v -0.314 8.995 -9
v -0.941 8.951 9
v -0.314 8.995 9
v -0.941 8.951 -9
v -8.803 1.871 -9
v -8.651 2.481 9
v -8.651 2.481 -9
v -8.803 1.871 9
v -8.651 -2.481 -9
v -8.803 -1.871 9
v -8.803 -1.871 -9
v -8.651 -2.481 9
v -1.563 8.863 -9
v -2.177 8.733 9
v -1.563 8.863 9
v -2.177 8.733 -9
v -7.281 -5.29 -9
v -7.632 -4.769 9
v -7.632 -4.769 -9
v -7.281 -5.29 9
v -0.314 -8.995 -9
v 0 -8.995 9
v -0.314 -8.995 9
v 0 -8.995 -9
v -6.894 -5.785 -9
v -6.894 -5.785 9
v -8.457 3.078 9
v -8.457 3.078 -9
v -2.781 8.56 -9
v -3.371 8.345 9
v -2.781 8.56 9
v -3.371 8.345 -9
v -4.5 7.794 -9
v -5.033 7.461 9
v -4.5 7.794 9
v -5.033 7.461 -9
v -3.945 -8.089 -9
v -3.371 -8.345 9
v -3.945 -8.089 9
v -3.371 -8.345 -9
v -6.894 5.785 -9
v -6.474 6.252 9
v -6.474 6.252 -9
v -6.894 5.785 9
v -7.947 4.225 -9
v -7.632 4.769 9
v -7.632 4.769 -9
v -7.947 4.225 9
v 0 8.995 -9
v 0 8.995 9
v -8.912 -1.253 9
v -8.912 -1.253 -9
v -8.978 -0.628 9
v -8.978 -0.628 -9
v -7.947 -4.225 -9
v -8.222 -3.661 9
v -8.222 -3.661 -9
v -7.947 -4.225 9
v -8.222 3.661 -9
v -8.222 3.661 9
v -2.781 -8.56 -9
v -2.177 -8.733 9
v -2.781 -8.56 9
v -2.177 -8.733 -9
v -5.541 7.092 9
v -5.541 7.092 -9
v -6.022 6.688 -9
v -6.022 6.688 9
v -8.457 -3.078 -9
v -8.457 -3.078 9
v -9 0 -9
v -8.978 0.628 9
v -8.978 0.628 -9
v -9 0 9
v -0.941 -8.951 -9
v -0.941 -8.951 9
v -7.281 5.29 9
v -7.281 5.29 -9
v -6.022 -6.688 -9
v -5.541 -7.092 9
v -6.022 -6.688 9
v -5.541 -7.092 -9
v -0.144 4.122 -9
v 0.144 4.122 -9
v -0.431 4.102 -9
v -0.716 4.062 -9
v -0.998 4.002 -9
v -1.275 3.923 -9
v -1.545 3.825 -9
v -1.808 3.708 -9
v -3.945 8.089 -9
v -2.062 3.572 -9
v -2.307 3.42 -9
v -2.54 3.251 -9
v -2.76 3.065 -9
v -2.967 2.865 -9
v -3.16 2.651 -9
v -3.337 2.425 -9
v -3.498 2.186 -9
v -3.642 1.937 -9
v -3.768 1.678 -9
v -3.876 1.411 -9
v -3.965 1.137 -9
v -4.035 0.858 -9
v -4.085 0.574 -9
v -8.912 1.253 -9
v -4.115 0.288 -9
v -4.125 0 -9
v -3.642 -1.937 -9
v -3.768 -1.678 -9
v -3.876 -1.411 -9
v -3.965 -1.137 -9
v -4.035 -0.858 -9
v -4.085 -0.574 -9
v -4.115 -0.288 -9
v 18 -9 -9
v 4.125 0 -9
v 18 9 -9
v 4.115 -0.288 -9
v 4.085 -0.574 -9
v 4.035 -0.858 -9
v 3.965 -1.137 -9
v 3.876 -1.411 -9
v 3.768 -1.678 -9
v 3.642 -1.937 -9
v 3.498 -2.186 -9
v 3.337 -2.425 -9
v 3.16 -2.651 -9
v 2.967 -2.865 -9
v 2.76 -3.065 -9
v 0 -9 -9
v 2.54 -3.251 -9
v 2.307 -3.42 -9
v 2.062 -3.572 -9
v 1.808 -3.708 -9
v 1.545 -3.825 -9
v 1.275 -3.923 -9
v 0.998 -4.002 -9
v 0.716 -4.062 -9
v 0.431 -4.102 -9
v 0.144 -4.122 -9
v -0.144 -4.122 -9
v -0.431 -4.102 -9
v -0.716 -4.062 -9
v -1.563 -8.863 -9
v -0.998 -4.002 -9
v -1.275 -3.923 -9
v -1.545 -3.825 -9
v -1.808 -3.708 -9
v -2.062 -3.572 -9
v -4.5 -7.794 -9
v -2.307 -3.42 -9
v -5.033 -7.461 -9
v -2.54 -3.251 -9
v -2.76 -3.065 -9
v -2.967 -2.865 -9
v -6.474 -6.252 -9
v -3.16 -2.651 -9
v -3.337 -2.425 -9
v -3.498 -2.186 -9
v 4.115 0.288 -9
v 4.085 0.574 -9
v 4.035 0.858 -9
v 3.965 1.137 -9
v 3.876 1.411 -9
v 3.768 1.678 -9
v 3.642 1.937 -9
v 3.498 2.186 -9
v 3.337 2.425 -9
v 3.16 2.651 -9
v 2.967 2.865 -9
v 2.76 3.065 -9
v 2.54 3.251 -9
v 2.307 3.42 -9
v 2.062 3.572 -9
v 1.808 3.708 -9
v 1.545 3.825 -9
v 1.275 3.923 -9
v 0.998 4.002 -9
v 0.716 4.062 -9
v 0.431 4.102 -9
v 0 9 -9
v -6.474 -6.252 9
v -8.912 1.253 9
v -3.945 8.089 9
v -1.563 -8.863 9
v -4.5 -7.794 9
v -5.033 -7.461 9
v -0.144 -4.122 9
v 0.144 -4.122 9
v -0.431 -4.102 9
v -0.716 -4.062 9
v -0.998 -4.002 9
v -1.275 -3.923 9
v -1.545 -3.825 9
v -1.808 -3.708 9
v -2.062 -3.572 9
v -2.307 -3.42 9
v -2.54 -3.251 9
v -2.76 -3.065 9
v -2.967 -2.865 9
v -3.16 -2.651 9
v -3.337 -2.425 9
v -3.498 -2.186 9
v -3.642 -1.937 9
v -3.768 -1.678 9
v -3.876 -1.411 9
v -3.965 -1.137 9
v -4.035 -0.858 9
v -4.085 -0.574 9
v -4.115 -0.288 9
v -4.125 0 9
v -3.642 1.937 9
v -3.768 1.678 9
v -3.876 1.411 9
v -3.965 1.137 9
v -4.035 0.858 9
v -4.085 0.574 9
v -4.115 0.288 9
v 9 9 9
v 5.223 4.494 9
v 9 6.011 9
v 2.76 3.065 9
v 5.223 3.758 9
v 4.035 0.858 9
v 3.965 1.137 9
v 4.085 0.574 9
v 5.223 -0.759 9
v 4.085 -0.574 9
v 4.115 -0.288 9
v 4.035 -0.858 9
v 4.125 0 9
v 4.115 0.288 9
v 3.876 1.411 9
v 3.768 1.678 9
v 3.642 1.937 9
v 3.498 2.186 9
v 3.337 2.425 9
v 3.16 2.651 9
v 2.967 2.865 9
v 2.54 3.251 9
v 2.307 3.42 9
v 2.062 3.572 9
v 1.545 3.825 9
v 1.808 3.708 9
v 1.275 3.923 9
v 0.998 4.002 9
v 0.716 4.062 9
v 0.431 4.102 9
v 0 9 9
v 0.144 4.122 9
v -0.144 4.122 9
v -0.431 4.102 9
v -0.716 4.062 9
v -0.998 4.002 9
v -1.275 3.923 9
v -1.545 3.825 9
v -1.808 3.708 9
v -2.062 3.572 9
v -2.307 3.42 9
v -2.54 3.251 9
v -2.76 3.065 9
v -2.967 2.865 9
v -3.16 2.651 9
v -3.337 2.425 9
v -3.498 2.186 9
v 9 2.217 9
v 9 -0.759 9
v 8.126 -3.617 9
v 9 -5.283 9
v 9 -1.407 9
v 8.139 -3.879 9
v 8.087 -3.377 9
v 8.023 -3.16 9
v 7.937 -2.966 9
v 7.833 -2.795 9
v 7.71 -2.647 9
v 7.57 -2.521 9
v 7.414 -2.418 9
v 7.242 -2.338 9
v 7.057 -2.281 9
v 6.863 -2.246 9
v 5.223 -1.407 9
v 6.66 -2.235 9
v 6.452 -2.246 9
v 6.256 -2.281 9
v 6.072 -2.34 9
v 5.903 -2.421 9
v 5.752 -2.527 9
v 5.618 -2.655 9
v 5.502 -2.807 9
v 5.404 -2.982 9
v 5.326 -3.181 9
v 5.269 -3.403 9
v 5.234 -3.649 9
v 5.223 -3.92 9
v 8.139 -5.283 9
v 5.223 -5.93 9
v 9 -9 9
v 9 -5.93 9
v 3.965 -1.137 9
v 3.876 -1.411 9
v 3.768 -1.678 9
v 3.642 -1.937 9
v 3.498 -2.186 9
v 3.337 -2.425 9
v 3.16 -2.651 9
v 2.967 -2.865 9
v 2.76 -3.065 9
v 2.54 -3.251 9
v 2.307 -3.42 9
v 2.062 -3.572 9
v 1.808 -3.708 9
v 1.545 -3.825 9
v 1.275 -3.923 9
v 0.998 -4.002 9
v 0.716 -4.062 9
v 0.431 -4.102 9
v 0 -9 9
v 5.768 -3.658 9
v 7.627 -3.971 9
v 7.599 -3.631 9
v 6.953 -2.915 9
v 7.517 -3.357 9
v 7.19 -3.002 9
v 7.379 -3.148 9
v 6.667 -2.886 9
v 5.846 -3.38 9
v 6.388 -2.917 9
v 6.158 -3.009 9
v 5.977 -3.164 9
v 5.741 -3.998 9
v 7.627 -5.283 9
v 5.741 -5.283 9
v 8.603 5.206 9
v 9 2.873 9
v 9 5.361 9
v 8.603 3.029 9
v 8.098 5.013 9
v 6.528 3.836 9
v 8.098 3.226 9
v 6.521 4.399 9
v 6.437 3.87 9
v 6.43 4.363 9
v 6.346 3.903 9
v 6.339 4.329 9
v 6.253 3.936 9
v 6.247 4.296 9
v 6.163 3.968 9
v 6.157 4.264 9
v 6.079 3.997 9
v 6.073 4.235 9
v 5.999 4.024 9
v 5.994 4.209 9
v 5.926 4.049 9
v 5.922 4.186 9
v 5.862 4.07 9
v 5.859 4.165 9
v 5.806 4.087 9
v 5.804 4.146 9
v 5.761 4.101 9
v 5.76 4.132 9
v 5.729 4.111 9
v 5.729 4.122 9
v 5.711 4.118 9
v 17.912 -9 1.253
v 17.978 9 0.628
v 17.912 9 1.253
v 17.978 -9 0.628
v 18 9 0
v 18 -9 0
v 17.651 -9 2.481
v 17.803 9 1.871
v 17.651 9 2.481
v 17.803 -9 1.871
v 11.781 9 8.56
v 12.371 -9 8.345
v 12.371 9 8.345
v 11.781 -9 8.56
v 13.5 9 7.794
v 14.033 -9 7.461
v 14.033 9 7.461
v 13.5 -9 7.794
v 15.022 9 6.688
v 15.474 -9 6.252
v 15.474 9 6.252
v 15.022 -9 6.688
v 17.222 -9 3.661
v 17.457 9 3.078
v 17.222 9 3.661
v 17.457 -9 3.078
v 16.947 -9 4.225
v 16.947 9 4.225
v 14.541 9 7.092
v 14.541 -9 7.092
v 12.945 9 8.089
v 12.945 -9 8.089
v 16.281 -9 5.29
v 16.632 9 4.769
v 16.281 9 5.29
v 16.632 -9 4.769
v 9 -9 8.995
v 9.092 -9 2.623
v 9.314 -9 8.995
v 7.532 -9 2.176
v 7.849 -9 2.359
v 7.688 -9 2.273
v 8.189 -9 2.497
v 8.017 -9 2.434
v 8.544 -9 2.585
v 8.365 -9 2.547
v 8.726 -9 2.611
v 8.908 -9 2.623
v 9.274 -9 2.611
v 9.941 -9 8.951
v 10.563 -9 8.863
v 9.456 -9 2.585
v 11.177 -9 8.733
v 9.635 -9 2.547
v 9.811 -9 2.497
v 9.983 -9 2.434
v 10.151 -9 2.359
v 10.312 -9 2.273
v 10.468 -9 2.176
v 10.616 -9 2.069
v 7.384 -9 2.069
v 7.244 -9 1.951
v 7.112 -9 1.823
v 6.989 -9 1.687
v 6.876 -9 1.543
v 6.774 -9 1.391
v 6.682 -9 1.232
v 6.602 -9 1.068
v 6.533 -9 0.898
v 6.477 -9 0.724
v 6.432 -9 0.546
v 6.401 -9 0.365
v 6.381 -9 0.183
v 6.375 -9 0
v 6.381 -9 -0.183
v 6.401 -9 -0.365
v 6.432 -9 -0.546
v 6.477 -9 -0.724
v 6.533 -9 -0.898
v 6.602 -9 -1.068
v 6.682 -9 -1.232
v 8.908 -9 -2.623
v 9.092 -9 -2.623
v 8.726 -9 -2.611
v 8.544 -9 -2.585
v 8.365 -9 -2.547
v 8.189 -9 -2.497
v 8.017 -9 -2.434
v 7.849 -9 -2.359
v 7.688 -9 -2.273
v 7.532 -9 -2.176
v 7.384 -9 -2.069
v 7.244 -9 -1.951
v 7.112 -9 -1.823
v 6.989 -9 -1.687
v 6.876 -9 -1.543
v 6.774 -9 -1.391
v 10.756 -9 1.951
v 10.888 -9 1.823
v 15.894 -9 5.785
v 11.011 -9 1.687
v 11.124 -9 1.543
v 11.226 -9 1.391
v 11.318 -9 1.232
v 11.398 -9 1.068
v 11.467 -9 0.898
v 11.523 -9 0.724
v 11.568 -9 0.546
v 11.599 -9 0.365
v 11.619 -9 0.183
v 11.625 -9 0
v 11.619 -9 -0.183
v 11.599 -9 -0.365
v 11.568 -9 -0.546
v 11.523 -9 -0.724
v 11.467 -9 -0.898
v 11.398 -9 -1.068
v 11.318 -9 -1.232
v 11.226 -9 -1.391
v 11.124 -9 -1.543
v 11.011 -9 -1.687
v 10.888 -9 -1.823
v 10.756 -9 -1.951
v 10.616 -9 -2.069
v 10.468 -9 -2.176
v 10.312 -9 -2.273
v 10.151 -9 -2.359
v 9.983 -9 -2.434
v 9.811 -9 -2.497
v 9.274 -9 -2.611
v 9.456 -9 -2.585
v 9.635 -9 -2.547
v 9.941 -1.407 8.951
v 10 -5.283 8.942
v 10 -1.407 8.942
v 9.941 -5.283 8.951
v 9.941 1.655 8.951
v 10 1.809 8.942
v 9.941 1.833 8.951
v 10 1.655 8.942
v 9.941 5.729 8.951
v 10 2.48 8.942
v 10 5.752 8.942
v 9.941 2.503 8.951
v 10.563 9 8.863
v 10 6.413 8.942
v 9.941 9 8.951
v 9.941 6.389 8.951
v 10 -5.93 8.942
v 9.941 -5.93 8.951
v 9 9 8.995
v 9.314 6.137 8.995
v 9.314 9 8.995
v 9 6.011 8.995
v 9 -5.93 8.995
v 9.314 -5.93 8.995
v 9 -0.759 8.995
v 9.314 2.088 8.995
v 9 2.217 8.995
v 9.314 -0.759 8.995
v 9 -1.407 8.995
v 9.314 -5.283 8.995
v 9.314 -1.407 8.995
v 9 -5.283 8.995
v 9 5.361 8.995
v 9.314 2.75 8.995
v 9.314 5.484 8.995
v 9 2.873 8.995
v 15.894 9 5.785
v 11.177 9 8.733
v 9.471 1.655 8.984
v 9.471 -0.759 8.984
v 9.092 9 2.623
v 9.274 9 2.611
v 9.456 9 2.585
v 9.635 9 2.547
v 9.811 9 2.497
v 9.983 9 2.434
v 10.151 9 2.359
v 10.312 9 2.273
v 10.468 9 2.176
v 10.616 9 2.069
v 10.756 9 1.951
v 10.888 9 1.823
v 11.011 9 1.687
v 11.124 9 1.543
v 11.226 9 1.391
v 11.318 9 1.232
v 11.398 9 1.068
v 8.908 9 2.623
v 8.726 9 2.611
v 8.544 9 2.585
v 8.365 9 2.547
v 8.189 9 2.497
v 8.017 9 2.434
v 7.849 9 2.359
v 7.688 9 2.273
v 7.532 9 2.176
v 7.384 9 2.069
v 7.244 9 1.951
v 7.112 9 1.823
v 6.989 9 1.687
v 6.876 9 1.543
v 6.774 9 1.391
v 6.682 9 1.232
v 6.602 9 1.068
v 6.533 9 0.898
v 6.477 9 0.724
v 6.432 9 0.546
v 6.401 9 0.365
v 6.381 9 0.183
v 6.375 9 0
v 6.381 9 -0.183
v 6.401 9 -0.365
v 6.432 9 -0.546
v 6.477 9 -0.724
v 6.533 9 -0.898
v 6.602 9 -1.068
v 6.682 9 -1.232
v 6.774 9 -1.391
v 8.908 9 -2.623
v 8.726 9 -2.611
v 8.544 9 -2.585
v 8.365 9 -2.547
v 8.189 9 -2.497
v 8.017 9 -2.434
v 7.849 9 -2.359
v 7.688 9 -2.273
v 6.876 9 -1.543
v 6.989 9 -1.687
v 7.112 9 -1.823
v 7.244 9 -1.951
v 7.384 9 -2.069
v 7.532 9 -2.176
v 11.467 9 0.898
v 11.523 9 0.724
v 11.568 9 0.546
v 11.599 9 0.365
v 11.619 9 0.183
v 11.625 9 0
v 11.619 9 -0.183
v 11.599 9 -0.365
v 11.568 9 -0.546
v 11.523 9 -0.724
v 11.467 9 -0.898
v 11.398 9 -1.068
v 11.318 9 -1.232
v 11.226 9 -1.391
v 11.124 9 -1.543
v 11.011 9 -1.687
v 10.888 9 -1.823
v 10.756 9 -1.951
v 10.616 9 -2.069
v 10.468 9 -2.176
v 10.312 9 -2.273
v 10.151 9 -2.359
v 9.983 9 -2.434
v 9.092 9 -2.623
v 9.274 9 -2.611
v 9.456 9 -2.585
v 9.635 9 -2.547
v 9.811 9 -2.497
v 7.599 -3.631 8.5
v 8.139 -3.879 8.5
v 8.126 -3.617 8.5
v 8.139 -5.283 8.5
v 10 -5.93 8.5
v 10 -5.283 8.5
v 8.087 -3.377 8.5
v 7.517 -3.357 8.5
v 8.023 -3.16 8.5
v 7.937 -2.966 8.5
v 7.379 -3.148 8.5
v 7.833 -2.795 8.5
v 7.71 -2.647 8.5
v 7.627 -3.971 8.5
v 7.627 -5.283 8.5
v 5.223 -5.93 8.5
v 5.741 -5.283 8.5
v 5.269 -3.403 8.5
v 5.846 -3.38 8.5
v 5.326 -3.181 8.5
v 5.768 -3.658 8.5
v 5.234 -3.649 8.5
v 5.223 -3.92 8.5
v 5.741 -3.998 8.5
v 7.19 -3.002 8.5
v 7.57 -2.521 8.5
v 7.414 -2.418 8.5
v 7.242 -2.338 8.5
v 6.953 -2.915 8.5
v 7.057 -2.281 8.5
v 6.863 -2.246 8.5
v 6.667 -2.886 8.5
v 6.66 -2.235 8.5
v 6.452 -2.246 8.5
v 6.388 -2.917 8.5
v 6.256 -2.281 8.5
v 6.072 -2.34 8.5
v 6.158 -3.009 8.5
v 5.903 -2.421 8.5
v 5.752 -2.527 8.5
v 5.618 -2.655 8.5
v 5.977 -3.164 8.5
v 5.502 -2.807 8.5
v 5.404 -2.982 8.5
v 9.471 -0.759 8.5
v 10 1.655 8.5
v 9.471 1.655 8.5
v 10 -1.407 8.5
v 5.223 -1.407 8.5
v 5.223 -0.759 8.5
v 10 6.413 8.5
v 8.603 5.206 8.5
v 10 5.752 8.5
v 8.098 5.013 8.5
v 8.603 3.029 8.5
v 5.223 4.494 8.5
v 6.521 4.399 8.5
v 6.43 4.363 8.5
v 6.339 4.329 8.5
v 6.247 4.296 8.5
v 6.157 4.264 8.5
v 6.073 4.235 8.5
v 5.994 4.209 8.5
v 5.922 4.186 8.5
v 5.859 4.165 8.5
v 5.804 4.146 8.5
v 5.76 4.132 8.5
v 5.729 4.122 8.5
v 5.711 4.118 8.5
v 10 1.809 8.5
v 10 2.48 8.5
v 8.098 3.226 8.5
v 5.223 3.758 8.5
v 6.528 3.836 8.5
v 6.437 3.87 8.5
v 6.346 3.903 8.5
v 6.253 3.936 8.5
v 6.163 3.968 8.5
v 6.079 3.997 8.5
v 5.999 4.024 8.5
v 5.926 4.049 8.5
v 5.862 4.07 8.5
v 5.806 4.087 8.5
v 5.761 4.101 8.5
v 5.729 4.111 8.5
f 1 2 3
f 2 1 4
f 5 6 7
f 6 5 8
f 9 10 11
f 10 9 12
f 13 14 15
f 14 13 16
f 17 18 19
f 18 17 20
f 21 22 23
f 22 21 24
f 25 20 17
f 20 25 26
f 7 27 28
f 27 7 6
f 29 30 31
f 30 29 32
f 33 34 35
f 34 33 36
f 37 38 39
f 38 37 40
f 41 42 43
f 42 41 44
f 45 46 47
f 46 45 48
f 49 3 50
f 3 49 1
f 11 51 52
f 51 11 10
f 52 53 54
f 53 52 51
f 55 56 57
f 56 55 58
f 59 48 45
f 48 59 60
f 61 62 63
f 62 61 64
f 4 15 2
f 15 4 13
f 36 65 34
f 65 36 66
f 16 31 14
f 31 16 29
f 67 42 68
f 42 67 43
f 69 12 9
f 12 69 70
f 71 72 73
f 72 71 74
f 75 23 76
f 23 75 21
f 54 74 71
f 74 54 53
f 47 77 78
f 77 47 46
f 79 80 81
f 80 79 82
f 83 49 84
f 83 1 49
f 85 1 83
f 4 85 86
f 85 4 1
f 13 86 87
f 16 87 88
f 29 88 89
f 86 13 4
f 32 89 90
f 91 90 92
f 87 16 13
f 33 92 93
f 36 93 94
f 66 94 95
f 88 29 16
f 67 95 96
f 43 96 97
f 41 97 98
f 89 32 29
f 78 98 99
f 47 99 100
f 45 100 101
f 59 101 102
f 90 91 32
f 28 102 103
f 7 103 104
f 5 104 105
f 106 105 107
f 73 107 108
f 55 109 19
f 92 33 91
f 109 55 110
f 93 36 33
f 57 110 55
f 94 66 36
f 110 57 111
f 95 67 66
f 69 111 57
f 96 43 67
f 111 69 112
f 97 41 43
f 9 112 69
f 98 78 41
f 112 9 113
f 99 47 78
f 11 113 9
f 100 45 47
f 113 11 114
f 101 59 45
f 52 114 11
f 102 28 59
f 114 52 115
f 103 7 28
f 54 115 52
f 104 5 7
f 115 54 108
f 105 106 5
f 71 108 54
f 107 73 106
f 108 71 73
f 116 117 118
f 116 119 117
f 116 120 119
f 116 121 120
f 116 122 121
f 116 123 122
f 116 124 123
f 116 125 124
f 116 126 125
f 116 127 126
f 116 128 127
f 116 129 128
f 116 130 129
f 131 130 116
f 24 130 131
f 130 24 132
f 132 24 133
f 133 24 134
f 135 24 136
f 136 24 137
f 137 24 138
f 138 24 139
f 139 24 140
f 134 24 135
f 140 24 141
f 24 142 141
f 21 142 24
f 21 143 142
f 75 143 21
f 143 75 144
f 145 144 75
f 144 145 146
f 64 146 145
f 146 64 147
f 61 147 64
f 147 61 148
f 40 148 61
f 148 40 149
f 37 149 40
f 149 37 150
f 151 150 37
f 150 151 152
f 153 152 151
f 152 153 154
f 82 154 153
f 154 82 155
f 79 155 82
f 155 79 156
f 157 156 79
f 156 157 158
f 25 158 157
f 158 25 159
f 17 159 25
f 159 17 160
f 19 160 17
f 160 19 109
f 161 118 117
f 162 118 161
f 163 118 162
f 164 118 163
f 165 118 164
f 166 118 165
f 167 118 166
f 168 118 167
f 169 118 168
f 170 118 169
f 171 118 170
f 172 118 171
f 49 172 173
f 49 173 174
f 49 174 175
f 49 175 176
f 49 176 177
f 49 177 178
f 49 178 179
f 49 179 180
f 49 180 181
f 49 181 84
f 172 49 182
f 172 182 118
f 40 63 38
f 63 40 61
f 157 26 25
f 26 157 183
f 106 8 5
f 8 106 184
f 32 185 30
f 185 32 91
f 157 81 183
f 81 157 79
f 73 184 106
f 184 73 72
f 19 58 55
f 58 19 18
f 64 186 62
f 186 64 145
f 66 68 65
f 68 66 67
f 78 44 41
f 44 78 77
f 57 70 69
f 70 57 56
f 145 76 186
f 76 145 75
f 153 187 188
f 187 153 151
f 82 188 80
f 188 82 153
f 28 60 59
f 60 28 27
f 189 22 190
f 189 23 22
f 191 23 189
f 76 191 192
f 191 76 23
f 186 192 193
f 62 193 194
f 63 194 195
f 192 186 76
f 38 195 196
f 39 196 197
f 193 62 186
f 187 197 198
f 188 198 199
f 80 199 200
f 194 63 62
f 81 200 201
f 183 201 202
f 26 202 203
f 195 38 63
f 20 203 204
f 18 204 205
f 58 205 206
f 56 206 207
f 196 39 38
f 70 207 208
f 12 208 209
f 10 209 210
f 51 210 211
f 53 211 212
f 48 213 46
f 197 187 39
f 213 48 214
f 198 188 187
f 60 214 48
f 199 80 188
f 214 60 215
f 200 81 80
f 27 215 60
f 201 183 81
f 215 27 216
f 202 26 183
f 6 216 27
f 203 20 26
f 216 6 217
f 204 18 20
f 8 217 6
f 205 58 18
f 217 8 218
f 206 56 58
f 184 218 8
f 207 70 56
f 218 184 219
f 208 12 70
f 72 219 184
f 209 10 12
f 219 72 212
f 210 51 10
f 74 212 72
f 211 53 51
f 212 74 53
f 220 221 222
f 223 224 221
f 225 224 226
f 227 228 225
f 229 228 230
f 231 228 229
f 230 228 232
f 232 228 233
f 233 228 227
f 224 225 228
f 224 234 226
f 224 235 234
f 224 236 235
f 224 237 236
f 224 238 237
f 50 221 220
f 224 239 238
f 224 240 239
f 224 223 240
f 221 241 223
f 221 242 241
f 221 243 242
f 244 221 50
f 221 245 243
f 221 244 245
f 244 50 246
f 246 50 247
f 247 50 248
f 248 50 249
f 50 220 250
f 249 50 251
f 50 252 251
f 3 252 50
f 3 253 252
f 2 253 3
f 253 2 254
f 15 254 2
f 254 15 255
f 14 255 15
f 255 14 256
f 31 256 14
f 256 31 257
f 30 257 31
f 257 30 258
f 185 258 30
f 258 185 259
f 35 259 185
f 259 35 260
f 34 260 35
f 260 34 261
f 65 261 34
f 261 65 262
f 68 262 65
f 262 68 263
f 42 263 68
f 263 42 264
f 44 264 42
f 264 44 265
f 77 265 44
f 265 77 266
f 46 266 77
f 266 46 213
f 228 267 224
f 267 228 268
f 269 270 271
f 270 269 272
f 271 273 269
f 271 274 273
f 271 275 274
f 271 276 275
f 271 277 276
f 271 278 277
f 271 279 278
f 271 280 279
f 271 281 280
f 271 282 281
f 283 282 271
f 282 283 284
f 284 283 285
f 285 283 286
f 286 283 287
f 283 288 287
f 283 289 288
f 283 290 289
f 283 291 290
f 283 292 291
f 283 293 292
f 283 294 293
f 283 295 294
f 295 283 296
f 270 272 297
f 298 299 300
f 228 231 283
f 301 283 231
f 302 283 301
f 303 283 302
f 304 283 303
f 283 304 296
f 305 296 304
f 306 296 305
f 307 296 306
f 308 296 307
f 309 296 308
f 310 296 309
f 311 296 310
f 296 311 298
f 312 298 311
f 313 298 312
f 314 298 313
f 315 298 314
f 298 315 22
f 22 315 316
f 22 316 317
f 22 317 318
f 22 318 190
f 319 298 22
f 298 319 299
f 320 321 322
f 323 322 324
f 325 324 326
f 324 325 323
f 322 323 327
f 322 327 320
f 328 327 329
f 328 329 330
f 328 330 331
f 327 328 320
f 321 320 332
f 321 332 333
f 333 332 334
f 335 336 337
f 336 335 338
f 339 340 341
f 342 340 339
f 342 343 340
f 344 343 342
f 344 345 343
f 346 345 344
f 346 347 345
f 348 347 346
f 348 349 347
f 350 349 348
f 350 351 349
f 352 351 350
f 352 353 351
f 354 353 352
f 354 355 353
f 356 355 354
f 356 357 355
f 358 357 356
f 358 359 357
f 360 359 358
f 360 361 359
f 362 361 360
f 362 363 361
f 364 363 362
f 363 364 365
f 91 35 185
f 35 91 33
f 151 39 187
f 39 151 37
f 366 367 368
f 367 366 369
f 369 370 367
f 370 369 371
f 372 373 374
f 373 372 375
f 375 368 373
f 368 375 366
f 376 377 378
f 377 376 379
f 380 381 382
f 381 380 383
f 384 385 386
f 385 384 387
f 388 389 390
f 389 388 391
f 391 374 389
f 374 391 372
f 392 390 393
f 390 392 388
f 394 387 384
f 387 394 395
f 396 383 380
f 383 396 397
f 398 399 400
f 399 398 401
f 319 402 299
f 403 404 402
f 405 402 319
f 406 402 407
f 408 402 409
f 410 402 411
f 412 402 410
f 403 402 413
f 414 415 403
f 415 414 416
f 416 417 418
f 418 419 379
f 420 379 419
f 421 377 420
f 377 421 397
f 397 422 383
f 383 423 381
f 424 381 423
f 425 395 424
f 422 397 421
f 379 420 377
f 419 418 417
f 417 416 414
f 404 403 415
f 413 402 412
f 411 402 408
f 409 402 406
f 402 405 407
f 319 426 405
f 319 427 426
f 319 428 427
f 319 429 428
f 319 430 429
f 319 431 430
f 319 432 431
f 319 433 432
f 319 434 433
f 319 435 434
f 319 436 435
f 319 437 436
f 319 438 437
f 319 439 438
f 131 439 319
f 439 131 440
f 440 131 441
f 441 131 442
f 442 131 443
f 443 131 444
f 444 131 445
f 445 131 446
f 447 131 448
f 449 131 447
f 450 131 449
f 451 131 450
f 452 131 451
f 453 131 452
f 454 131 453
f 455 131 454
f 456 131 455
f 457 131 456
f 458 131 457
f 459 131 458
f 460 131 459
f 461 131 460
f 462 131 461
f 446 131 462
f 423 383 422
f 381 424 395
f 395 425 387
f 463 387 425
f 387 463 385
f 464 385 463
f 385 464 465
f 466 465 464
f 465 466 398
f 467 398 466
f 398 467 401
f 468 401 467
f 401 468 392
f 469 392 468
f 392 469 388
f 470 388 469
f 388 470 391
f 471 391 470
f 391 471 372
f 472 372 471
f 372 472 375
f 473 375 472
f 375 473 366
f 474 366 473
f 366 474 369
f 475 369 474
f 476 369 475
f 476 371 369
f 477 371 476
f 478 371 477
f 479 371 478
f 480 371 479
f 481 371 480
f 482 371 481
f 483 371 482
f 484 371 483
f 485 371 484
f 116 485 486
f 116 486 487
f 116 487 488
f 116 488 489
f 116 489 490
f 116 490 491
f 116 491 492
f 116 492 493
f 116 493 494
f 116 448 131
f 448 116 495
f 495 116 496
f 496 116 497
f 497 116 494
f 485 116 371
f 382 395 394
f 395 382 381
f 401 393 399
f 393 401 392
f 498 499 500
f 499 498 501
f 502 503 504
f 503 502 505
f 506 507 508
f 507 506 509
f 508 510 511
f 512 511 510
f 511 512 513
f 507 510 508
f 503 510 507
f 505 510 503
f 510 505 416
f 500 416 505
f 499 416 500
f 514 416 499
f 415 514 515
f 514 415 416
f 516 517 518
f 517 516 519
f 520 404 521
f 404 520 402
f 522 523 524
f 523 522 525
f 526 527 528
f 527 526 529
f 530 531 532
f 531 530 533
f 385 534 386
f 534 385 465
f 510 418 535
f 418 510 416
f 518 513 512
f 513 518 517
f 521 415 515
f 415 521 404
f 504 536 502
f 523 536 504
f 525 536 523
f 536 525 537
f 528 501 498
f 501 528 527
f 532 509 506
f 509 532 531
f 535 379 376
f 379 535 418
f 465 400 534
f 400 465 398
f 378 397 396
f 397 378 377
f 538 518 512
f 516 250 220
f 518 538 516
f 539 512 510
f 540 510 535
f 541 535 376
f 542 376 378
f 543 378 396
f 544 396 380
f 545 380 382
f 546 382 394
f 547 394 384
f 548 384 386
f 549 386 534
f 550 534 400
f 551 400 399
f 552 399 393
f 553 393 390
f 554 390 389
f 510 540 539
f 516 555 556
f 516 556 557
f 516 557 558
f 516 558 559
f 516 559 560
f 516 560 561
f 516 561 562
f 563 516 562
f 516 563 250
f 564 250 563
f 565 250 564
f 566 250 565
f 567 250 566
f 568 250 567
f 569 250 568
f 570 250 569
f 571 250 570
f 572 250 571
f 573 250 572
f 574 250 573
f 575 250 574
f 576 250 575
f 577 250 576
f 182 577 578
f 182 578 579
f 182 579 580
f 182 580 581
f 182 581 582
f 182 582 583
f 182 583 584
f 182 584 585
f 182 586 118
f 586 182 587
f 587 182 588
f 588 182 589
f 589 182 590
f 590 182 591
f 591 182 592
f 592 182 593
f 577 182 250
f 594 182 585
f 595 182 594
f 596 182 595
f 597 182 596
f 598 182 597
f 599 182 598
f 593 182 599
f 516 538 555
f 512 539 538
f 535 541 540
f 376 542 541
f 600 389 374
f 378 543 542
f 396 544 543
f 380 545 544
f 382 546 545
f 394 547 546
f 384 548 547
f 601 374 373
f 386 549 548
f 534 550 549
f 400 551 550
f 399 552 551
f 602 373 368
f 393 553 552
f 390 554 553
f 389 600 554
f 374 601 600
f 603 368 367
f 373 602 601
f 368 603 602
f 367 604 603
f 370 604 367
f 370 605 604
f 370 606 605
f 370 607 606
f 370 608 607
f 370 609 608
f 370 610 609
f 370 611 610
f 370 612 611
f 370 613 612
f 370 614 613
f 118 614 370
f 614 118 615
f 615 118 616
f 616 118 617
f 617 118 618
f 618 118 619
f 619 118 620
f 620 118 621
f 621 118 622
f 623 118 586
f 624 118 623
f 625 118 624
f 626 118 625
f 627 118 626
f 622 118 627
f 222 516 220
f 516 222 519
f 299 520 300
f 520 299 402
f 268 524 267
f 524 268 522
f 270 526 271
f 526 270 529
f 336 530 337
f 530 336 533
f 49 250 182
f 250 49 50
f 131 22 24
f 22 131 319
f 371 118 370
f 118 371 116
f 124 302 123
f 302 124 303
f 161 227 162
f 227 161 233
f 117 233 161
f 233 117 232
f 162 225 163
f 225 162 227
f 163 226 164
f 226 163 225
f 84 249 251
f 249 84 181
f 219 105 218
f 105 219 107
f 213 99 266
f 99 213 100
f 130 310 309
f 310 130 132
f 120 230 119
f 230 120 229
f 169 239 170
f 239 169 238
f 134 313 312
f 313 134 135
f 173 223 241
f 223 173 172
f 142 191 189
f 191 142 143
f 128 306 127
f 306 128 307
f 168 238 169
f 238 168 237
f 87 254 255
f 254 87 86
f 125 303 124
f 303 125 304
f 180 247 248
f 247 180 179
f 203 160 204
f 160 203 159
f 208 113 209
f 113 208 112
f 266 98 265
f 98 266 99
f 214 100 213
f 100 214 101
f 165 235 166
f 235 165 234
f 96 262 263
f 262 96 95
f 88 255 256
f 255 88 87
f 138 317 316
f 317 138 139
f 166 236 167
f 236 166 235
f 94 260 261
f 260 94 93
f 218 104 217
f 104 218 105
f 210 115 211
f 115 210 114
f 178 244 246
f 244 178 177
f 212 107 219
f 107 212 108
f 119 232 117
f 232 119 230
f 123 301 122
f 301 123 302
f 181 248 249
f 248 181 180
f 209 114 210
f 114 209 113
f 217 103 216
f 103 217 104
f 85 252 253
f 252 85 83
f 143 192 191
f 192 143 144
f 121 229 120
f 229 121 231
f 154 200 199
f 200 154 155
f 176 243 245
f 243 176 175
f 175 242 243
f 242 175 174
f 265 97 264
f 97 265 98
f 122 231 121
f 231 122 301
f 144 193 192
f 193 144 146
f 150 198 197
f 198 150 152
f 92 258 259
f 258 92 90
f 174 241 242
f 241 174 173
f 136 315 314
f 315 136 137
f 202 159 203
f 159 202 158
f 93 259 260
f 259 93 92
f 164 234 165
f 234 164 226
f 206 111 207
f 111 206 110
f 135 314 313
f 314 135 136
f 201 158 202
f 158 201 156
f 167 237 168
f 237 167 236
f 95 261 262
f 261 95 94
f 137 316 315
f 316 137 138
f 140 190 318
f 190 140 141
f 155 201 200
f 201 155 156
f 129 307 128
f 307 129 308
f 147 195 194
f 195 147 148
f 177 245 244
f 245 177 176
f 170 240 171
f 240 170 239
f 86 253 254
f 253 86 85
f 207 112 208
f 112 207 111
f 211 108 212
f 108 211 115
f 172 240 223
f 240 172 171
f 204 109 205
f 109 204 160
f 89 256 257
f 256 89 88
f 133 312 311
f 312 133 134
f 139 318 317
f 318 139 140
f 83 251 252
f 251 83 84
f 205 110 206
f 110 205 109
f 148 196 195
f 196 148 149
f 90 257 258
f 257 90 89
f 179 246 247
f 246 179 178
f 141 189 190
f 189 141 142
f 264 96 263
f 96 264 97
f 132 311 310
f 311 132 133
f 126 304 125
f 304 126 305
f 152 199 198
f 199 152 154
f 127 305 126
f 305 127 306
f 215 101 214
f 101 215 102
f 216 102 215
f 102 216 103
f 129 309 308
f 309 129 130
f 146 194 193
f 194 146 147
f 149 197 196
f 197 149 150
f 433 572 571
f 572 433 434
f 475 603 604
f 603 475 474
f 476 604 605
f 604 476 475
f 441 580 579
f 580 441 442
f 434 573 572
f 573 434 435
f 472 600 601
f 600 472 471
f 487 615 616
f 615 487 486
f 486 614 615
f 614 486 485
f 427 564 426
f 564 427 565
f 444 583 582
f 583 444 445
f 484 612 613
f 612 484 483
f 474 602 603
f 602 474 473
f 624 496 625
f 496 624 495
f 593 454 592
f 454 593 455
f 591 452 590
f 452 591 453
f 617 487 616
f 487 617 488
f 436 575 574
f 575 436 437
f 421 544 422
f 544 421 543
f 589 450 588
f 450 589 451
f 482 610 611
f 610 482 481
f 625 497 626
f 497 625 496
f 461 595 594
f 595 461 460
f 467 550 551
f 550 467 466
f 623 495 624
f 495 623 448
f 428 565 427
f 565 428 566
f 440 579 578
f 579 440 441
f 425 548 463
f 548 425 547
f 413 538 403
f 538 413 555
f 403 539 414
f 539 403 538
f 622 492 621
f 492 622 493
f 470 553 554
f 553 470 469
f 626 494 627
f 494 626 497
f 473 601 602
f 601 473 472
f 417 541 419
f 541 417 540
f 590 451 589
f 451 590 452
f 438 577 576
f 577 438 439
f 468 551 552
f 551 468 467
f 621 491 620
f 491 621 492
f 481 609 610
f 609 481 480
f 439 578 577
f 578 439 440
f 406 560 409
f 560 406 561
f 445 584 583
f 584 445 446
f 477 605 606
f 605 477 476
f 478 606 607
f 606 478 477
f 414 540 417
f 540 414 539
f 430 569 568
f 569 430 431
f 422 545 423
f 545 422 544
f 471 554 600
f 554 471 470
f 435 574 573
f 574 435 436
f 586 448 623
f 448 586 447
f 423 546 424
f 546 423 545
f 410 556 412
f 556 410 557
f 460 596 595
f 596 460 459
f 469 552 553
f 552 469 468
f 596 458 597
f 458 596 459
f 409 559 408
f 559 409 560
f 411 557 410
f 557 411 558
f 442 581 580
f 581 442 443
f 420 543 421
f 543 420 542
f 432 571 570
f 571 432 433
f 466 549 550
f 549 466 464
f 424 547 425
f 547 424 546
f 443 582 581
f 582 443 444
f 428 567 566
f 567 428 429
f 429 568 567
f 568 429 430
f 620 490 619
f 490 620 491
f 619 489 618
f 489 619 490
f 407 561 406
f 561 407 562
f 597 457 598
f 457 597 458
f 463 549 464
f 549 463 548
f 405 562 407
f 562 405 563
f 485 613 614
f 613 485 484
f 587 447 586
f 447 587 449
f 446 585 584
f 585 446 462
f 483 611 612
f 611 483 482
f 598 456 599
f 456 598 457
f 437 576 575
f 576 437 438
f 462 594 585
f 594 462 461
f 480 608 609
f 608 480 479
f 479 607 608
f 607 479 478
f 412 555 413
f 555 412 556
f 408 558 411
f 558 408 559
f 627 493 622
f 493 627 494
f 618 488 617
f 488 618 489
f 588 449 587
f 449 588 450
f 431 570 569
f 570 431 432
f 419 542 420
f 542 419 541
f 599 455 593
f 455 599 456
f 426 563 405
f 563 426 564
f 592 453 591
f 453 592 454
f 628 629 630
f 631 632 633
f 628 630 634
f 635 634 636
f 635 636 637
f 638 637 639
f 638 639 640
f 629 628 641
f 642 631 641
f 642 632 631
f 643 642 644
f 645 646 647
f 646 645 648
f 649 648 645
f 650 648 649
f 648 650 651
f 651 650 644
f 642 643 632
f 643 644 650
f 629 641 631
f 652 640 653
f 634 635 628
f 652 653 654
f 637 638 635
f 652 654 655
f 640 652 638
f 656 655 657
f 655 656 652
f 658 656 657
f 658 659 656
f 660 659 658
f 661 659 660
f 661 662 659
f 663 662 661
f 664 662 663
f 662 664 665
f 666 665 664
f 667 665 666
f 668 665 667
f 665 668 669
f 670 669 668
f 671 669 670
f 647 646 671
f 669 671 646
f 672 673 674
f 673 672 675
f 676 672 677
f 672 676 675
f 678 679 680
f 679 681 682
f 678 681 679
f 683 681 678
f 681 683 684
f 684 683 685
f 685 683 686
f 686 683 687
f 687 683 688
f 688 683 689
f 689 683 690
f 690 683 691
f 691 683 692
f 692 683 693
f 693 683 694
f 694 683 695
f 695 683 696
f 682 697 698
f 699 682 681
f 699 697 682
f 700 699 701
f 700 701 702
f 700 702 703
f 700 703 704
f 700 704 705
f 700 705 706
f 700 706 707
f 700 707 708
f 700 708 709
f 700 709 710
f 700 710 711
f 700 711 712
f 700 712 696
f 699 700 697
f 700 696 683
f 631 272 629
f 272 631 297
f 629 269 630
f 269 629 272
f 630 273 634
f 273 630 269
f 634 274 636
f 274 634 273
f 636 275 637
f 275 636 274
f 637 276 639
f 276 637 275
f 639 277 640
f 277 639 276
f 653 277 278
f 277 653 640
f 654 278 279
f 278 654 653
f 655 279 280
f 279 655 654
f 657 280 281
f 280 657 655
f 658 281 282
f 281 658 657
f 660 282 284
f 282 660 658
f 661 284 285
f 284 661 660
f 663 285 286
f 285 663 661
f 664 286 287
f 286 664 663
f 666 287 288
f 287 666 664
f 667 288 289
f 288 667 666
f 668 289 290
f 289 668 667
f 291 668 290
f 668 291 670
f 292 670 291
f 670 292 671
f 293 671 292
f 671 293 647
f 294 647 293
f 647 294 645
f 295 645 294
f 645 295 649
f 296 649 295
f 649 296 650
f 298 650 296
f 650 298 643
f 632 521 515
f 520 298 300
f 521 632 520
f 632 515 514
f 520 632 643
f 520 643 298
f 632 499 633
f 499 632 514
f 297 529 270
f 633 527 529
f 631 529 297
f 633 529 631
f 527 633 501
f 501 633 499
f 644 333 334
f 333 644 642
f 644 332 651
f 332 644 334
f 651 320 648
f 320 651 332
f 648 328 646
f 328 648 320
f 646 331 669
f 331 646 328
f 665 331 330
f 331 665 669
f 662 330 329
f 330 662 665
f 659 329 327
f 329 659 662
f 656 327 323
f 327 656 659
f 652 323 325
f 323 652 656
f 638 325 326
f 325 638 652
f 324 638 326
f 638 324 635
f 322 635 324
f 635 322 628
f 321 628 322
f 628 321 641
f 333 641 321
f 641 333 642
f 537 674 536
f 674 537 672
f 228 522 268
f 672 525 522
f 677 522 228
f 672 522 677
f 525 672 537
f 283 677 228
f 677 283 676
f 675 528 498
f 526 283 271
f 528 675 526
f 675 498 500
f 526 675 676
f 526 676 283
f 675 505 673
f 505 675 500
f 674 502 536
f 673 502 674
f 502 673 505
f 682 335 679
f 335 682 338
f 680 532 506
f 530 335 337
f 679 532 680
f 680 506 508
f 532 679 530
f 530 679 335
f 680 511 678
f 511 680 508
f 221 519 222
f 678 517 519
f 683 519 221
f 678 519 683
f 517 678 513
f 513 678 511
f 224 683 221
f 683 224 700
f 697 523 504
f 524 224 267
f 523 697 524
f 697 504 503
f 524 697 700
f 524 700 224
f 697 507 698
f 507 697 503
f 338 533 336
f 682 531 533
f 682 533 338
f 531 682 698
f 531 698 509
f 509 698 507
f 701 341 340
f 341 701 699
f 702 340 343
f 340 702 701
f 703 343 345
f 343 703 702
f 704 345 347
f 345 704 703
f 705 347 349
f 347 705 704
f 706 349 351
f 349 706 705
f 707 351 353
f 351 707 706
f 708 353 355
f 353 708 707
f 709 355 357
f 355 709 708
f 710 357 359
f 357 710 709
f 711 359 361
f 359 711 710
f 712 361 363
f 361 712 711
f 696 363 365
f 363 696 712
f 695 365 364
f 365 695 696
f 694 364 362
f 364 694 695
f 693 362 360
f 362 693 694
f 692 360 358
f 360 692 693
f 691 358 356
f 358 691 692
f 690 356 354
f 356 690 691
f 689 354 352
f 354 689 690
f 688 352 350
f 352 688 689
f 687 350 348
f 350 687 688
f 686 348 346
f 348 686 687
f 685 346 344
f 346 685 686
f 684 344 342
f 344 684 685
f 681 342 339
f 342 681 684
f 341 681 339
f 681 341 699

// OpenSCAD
//cube([120,120,3], center = true);
//translate([-45,-45,0])cylinder(h = 3, r=15, $fn = 180, center = true);
//rotate_extrude(convexity = 10, $fn = A) translate([20+1.5, 0, 0])circle(d = 3, $fn = B);
//module Test(){
//import("asd.stl");

//sphere(2, $fn=100); 

//linear_extrude(height = 10)text("asd",10);


/*
linear_extrude(height=100,twist=360,$fn=360) 
translate([45,0,0])
rotate([0,0,9])
square([5,15]);

rotate_extrude(angle = 270, $fn=30)
translate([10,0,0])square([10,5]);
*/

/*

CubePoints = [
  [  0,  0,  0 ],  //0
  [ 10,  0,  0 ],  //1
  [ 10,  7,  0 ],  //2
  [  0,  7,  0 ],  //3
  [  0,  0,  5 ],  //4
  [ 10,  0,  5 ],  //5
  [ 10,  7,  5 ],  //6
  [  0,  7,  5 ]]; //7
  
CubeFaces = [
  [0,1,2,3],  // bottom
  [4,5,1,0],  // front
  [7,6,5,4],  // top
  [5,6,2,1],  // right
  [6,7,3,2],  // back
  [7,4,0,3]]; // left
  
polyhedron( CubePoints, CubeFaces );
     
*/     

difference(){
union(){   
cylinder(h = 18, d=18, $fn = 90, center = true);

translate([9,0,0])rotate([90,0,0])cylinder(h = 18, d=18, $fn = 90, center = true);
    
translate([4.5,0,0])cube([9,18,18], center = true);   
   
   
translate([9,0,-4.5])cube([18,18,9], center = true);    
    
    
}
cylinder(h = 19, d=8.25, $fn = 90, center = true);

translate([9,0,0])rotate([90,0,0])cylinder(h = 19, d=5.25, $fn = 90, center = true);

translate([10,-6.5,8.5])rotate([0,0,90])linear_extrude(height = 0.5)text("PLA",5);
}


    
